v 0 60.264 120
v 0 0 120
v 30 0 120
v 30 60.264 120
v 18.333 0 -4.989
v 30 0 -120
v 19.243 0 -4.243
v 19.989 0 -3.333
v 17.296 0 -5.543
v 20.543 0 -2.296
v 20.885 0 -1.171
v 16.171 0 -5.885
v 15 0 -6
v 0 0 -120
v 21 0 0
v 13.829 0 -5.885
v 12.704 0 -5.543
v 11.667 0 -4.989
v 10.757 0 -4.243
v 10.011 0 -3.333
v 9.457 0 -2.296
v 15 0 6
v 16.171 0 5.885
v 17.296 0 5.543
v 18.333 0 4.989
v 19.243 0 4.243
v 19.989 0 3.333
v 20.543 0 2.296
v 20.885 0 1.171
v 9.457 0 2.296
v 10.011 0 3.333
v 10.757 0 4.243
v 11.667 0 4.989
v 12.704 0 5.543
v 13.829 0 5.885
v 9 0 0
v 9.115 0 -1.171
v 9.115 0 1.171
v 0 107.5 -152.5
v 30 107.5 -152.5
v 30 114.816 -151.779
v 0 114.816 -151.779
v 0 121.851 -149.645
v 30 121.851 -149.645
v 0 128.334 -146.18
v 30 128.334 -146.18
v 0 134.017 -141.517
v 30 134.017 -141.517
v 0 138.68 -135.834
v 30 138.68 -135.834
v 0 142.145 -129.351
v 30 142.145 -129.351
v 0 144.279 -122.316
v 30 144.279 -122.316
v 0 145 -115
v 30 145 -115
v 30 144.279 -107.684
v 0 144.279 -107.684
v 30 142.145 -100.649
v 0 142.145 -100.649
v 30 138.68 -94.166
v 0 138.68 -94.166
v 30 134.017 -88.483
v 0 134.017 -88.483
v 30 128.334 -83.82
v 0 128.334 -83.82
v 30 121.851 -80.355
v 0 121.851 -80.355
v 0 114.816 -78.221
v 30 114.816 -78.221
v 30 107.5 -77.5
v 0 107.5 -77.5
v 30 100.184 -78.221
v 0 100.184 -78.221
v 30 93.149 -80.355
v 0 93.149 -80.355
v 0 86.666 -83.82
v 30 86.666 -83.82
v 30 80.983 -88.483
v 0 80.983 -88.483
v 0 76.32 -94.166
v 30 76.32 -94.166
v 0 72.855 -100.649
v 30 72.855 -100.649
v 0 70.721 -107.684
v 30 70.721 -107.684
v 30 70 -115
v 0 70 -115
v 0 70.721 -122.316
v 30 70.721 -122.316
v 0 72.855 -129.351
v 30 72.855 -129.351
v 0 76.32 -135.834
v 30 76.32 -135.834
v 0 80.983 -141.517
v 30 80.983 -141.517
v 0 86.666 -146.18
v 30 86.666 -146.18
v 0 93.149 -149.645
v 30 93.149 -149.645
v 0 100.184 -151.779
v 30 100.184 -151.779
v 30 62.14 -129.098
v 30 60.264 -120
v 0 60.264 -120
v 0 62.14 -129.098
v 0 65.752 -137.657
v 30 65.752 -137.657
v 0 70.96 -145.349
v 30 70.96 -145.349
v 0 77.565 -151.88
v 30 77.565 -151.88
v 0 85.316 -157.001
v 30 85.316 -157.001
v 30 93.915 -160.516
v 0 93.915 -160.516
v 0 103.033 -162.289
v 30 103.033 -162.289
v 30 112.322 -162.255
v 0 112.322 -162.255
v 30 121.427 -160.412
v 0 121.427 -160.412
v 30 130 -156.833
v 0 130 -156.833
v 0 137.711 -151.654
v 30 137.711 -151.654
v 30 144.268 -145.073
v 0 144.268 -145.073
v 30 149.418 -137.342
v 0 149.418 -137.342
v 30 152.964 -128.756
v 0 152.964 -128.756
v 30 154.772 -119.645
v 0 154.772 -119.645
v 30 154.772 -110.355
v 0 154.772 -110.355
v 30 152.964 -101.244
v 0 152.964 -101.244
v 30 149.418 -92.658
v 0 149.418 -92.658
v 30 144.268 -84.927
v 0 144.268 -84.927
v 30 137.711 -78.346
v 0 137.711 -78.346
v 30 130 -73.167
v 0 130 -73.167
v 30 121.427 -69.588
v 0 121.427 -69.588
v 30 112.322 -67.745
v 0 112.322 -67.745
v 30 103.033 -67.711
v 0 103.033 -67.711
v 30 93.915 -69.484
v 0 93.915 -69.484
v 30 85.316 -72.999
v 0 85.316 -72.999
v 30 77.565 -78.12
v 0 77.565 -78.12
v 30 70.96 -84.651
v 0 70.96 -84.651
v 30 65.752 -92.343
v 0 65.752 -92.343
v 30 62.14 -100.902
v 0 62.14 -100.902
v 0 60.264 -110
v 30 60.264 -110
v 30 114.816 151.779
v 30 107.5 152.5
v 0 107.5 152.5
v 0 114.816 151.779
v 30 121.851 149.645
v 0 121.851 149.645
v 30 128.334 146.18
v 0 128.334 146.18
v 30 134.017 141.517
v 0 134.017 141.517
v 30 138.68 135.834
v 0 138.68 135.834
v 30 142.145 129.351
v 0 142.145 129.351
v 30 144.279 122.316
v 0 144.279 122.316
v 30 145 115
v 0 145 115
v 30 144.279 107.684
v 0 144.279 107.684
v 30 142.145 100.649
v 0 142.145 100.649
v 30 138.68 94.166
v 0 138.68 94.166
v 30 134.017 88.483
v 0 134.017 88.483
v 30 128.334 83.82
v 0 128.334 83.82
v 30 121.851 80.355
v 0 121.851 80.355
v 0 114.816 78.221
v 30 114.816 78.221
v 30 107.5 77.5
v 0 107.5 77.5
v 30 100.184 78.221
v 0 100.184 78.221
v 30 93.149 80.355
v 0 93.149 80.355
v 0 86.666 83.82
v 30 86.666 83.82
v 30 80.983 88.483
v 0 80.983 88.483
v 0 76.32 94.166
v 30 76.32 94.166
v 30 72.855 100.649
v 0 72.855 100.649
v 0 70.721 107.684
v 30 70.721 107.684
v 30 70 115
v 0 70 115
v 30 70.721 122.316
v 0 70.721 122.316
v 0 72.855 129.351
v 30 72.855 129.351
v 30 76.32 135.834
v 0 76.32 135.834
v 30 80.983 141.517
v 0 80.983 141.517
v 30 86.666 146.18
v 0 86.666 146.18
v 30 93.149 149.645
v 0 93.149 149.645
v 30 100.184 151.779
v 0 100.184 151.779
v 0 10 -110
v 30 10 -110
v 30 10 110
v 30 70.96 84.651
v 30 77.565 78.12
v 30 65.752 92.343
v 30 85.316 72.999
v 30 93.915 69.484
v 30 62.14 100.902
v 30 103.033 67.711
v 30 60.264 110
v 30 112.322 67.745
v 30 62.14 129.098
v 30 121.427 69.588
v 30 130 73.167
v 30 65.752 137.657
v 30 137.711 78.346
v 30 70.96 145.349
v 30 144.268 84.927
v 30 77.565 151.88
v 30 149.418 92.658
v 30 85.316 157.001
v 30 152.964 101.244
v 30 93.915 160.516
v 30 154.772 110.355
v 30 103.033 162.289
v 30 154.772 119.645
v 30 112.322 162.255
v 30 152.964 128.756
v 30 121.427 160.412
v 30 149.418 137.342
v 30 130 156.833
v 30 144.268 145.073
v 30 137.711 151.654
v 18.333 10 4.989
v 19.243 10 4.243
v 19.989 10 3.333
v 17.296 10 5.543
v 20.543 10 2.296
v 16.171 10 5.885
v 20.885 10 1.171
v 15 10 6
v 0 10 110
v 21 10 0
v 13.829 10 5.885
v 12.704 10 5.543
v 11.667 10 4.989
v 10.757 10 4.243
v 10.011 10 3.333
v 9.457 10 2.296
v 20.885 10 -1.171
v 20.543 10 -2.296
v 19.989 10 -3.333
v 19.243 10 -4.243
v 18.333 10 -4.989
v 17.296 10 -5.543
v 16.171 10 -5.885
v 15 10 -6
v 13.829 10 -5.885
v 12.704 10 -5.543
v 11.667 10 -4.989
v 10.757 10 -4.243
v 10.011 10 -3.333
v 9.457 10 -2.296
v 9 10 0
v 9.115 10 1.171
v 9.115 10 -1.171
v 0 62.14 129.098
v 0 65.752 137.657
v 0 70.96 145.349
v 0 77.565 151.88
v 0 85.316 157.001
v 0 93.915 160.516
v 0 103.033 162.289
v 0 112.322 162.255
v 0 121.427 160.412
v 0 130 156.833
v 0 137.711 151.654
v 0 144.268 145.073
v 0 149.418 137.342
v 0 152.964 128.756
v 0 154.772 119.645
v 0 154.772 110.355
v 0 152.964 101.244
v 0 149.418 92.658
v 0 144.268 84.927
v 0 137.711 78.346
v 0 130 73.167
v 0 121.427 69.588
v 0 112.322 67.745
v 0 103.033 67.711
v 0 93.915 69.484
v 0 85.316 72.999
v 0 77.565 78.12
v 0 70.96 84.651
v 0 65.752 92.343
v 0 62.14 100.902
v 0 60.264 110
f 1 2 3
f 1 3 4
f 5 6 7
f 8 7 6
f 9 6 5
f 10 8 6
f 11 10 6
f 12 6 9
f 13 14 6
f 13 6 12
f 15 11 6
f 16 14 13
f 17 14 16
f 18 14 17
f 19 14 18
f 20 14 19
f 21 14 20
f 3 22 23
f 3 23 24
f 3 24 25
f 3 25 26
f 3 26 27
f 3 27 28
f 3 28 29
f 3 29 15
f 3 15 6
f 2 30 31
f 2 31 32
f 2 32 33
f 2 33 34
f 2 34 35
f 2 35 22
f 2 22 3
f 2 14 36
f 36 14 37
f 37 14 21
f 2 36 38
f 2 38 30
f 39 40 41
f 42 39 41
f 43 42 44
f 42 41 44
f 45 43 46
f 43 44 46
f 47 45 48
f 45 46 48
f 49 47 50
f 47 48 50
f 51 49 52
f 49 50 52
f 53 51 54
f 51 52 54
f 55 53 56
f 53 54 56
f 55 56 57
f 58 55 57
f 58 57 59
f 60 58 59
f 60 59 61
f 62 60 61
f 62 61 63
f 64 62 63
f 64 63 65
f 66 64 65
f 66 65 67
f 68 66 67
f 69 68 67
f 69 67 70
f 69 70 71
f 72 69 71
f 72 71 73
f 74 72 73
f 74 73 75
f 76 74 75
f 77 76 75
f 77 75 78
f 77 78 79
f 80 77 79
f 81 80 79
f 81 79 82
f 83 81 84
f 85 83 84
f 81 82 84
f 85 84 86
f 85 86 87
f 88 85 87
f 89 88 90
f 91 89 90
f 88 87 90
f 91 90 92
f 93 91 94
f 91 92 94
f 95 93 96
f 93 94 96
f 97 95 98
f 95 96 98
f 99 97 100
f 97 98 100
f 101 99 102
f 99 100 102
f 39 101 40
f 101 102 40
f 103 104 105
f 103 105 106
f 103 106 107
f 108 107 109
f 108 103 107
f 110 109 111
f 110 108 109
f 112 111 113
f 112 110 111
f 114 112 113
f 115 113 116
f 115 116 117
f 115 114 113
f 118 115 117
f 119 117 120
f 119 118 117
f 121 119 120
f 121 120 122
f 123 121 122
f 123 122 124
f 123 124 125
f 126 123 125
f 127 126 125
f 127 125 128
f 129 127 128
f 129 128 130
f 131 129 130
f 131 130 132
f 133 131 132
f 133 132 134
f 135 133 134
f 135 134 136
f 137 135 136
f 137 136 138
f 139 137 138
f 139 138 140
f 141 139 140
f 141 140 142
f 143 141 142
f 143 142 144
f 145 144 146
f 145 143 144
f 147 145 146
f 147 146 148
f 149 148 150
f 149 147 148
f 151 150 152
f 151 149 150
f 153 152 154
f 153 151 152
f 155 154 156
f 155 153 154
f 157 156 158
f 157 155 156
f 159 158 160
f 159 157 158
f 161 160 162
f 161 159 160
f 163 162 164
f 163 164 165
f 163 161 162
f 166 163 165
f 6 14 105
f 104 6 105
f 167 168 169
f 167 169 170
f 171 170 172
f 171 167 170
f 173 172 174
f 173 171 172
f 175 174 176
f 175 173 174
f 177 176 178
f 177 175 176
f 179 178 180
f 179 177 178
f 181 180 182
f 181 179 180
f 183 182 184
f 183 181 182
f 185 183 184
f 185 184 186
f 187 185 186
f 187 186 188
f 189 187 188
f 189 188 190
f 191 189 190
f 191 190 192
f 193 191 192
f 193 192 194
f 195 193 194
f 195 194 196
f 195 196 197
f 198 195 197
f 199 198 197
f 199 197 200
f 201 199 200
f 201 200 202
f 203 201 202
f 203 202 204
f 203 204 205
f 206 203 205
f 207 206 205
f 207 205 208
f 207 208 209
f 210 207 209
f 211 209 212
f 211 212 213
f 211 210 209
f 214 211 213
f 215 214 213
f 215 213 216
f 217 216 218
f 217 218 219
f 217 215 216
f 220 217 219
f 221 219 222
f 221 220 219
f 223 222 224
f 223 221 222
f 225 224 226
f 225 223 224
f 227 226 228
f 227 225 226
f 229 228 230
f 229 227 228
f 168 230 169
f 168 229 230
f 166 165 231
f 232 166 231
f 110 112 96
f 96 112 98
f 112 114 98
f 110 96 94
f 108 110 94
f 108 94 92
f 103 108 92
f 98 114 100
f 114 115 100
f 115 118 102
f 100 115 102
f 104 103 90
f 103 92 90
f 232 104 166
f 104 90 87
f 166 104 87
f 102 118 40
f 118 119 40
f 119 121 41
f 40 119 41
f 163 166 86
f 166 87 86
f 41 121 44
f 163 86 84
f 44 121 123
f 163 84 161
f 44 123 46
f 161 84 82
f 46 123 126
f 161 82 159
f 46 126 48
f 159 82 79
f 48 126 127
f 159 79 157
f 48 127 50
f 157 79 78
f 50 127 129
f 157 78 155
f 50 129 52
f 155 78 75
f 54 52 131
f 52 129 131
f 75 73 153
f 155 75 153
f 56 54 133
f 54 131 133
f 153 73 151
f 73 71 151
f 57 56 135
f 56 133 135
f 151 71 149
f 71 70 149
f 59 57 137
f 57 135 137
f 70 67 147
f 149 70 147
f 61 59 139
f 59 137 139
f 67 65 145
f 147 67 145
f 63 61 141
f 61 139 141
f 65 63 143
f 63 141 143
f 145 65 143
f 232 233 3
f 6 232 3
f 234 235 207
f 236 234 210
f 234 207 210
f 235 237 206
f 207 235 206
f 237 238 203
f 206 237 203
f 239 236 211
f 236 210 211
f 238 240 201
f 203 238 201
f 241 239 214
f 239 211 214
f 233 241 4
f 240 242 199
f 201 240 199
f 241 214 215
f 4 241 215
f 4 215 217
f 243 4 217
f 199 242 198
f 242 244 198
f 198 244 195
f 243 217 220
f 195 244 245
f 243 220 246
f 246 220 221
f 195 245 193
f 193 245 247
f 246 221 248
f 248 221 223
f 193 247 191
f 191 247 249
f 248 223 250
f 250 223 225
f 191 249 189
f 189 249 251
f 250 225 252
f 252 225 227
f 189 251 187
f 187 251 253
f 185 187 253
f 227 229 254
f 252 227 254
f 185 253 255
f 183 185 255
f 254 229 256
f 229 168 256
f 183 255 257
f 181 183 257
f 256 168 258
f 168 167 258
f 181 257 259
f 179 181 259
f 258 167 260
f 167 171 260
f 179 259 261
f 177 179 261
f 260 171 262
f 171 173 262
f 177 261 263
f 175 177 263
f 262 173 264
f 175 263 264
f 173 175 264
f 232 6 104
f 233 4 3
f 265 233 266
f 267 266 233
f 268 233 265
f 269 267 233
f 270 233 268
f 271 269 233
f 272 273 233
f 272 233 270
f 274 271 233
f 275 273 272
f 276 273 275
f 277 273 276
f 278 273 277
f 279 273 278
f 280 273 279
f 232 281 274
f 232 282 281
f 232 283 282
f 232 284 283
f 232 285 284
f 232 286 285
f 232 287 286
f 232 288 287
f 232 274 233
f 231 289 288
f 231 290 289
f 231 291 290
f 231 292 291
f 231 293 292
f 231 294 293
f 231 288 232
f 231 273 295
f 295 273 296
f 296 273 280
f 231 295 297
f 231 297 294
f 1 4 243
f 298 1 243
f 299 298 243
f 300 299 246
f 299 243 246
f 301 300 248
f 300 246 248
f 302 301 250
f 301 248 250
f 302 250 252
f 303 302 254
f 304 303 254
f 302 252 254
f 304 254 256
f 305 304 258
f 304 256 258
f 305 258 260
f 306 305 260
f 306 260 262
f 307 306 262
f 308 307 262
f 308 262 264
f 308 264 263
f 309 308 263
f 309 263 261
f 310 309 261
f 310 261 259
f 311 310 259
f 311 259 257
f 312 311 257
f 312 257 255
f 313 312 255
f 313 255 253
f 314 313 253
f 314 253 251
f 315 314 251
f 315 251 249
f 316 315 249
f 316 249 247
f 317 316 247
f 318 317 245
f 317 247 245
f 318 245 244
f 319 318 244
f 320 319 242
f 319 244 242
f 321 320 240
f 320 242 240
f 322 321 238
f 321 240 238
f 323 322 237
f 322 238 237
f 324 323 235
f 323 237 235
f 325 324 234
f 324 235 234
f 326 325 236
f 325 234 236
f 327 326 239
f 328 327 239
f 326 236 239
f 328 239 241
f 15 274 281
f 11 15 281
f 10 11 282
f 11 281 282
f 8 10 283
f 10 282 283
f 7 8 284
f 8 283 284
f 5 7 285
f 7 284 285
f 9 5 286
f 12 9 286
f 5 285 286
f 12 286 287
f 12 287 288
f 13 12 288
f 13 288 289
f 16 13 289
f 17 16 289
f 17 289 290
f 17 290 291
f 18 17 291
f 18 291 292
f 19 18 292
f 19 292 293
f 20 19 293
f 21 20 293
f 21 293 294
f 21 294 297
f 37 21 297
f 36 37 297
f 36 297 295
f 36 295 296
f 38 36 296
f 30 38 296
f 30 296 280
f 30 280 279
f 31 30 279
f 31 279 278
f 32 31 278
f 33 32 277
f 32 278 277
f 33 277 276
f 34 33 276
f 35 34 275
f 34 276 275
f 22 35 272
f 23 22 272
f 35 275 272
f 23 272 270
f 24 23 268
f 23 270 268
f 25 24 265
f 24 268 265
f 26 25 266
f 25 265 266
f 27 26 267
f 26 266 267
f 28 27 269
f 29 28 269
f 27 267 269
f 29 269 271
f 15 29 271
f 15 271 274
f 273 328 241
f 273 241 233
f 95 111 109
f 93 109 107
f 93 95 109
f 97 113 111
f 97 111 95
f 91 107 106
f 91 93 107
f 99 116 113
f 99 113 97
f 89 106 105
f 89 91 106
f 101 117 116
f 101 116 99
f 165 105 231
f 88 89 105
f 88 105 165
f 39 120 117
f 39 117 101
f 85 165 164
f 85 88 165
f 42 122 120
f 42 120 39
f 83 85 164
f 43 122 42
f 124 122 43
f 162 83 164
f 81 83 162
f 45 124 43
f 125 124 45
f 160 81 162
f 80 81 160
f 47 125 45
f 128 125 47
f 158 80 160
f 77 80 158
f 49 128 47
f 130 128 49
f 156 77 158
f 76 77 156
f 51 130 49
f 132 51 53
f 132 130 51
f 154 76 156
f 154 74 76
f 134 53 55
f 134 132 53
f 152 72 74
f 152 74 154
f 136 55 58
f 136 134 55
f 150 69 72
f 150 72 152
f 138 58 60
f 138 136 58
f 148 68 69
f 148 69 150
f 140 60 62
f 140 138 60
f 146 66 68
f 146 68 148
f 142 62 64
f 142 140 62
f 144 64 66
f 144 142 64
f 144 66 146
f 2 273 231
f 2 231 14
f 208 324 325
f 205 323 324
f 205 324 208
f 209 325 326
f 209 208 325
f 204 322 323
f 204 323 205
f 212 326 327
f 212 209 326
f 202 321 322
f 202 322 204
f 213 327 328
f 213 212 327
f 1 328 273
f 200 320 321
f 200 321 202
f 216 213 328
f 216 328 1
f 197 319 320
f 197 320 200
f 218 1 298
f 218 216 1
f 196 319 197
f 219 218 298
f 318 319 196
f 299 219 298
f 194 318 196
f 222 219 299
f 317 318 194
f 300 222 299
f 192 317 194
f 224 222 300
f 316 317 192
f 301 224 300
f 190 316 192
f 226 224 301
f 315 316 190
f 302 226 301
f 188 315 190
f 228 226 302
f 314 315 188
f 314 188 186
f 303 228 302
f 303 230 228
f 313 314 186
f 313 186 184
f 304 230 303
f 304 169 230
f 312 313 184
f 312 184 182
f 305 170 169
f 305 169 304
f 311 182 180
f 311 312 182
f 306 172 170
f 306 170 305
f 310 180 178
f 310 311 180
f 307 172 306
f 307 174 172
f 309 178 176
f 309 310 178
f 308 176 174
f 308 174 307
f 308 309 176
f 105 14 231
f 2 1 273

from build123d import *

# Parameters (mm, degrees)
EXTRUDE_THIN2_DEPTH     = 30
SKETCH2_R               = 47.5
SKETCH2_R_2             = 37.5
EXTRUDE_THIN3_DEPTH     = 30
SKETCH3_R               = 6
CUT_EXTRUDE1_DEPTH      = 146
CUT_EXTRUDE1_DEPTH_BACK = 11


with BuildPart() as part:
    # Sketch1 → Extrude-Thin2 (new body)
    with BuildSketch(Plane(origin=(0, 0, 0), x_dir=(0, 0, -1), z_dir=(1, 0, 0))):
        Polygon((0, 0), (120, 0), (120, 70), (110, 70), (110, 10), (0, 10), align=None)
    extrude(amount=EXTRUDE_THIN2_DEPTH)

    # Sketch2 → Extrude-Thin3 (add)
    with BuildSketch(Plane(origin=(30, 0, 0), x_dir=(0, 0, -1), z_dir=(1, 0, 0))):
        with Locations((115, 107.5)):
            Circle(SKETCH2_R)
        with Locations((115, 107.5)):
            Circle(SKETCH2_R_2, mode=Mode.SUBTRACT)
    extrude(amount=-EXTRUDE_THIN3_DEPTH)

    # Mirror1: part across plane


with BuildPart() as part_1:
    add(part.part)
    add(part.part.mirror(Plane(origin=(30, 0, 0), x_dir=(1, 0, 0), z_dir=(0, 0, 1))))

    # Sketch3 → Cut-Extrude1 (cut, two sides)
    with BuildSketch(Plane(origin=(0, 10, 0), x_dir=(1, 0, 0), z_dir=(0, 1, 0))) as cut_extrude1_sk:
        with Locations((15, 0)):
            Circle(SKETCH3_R)
    extrude(amount=CUT_EXTRUDE1_DEPTH, mode=Mode.SUBTRACT)
    extrude(cut_extrude1_sk.sketch, amount=-CUT_EXTRUDE1_DEPTH_BACK, mode=Mode.SUBTRACT)


solid = part_1.part
